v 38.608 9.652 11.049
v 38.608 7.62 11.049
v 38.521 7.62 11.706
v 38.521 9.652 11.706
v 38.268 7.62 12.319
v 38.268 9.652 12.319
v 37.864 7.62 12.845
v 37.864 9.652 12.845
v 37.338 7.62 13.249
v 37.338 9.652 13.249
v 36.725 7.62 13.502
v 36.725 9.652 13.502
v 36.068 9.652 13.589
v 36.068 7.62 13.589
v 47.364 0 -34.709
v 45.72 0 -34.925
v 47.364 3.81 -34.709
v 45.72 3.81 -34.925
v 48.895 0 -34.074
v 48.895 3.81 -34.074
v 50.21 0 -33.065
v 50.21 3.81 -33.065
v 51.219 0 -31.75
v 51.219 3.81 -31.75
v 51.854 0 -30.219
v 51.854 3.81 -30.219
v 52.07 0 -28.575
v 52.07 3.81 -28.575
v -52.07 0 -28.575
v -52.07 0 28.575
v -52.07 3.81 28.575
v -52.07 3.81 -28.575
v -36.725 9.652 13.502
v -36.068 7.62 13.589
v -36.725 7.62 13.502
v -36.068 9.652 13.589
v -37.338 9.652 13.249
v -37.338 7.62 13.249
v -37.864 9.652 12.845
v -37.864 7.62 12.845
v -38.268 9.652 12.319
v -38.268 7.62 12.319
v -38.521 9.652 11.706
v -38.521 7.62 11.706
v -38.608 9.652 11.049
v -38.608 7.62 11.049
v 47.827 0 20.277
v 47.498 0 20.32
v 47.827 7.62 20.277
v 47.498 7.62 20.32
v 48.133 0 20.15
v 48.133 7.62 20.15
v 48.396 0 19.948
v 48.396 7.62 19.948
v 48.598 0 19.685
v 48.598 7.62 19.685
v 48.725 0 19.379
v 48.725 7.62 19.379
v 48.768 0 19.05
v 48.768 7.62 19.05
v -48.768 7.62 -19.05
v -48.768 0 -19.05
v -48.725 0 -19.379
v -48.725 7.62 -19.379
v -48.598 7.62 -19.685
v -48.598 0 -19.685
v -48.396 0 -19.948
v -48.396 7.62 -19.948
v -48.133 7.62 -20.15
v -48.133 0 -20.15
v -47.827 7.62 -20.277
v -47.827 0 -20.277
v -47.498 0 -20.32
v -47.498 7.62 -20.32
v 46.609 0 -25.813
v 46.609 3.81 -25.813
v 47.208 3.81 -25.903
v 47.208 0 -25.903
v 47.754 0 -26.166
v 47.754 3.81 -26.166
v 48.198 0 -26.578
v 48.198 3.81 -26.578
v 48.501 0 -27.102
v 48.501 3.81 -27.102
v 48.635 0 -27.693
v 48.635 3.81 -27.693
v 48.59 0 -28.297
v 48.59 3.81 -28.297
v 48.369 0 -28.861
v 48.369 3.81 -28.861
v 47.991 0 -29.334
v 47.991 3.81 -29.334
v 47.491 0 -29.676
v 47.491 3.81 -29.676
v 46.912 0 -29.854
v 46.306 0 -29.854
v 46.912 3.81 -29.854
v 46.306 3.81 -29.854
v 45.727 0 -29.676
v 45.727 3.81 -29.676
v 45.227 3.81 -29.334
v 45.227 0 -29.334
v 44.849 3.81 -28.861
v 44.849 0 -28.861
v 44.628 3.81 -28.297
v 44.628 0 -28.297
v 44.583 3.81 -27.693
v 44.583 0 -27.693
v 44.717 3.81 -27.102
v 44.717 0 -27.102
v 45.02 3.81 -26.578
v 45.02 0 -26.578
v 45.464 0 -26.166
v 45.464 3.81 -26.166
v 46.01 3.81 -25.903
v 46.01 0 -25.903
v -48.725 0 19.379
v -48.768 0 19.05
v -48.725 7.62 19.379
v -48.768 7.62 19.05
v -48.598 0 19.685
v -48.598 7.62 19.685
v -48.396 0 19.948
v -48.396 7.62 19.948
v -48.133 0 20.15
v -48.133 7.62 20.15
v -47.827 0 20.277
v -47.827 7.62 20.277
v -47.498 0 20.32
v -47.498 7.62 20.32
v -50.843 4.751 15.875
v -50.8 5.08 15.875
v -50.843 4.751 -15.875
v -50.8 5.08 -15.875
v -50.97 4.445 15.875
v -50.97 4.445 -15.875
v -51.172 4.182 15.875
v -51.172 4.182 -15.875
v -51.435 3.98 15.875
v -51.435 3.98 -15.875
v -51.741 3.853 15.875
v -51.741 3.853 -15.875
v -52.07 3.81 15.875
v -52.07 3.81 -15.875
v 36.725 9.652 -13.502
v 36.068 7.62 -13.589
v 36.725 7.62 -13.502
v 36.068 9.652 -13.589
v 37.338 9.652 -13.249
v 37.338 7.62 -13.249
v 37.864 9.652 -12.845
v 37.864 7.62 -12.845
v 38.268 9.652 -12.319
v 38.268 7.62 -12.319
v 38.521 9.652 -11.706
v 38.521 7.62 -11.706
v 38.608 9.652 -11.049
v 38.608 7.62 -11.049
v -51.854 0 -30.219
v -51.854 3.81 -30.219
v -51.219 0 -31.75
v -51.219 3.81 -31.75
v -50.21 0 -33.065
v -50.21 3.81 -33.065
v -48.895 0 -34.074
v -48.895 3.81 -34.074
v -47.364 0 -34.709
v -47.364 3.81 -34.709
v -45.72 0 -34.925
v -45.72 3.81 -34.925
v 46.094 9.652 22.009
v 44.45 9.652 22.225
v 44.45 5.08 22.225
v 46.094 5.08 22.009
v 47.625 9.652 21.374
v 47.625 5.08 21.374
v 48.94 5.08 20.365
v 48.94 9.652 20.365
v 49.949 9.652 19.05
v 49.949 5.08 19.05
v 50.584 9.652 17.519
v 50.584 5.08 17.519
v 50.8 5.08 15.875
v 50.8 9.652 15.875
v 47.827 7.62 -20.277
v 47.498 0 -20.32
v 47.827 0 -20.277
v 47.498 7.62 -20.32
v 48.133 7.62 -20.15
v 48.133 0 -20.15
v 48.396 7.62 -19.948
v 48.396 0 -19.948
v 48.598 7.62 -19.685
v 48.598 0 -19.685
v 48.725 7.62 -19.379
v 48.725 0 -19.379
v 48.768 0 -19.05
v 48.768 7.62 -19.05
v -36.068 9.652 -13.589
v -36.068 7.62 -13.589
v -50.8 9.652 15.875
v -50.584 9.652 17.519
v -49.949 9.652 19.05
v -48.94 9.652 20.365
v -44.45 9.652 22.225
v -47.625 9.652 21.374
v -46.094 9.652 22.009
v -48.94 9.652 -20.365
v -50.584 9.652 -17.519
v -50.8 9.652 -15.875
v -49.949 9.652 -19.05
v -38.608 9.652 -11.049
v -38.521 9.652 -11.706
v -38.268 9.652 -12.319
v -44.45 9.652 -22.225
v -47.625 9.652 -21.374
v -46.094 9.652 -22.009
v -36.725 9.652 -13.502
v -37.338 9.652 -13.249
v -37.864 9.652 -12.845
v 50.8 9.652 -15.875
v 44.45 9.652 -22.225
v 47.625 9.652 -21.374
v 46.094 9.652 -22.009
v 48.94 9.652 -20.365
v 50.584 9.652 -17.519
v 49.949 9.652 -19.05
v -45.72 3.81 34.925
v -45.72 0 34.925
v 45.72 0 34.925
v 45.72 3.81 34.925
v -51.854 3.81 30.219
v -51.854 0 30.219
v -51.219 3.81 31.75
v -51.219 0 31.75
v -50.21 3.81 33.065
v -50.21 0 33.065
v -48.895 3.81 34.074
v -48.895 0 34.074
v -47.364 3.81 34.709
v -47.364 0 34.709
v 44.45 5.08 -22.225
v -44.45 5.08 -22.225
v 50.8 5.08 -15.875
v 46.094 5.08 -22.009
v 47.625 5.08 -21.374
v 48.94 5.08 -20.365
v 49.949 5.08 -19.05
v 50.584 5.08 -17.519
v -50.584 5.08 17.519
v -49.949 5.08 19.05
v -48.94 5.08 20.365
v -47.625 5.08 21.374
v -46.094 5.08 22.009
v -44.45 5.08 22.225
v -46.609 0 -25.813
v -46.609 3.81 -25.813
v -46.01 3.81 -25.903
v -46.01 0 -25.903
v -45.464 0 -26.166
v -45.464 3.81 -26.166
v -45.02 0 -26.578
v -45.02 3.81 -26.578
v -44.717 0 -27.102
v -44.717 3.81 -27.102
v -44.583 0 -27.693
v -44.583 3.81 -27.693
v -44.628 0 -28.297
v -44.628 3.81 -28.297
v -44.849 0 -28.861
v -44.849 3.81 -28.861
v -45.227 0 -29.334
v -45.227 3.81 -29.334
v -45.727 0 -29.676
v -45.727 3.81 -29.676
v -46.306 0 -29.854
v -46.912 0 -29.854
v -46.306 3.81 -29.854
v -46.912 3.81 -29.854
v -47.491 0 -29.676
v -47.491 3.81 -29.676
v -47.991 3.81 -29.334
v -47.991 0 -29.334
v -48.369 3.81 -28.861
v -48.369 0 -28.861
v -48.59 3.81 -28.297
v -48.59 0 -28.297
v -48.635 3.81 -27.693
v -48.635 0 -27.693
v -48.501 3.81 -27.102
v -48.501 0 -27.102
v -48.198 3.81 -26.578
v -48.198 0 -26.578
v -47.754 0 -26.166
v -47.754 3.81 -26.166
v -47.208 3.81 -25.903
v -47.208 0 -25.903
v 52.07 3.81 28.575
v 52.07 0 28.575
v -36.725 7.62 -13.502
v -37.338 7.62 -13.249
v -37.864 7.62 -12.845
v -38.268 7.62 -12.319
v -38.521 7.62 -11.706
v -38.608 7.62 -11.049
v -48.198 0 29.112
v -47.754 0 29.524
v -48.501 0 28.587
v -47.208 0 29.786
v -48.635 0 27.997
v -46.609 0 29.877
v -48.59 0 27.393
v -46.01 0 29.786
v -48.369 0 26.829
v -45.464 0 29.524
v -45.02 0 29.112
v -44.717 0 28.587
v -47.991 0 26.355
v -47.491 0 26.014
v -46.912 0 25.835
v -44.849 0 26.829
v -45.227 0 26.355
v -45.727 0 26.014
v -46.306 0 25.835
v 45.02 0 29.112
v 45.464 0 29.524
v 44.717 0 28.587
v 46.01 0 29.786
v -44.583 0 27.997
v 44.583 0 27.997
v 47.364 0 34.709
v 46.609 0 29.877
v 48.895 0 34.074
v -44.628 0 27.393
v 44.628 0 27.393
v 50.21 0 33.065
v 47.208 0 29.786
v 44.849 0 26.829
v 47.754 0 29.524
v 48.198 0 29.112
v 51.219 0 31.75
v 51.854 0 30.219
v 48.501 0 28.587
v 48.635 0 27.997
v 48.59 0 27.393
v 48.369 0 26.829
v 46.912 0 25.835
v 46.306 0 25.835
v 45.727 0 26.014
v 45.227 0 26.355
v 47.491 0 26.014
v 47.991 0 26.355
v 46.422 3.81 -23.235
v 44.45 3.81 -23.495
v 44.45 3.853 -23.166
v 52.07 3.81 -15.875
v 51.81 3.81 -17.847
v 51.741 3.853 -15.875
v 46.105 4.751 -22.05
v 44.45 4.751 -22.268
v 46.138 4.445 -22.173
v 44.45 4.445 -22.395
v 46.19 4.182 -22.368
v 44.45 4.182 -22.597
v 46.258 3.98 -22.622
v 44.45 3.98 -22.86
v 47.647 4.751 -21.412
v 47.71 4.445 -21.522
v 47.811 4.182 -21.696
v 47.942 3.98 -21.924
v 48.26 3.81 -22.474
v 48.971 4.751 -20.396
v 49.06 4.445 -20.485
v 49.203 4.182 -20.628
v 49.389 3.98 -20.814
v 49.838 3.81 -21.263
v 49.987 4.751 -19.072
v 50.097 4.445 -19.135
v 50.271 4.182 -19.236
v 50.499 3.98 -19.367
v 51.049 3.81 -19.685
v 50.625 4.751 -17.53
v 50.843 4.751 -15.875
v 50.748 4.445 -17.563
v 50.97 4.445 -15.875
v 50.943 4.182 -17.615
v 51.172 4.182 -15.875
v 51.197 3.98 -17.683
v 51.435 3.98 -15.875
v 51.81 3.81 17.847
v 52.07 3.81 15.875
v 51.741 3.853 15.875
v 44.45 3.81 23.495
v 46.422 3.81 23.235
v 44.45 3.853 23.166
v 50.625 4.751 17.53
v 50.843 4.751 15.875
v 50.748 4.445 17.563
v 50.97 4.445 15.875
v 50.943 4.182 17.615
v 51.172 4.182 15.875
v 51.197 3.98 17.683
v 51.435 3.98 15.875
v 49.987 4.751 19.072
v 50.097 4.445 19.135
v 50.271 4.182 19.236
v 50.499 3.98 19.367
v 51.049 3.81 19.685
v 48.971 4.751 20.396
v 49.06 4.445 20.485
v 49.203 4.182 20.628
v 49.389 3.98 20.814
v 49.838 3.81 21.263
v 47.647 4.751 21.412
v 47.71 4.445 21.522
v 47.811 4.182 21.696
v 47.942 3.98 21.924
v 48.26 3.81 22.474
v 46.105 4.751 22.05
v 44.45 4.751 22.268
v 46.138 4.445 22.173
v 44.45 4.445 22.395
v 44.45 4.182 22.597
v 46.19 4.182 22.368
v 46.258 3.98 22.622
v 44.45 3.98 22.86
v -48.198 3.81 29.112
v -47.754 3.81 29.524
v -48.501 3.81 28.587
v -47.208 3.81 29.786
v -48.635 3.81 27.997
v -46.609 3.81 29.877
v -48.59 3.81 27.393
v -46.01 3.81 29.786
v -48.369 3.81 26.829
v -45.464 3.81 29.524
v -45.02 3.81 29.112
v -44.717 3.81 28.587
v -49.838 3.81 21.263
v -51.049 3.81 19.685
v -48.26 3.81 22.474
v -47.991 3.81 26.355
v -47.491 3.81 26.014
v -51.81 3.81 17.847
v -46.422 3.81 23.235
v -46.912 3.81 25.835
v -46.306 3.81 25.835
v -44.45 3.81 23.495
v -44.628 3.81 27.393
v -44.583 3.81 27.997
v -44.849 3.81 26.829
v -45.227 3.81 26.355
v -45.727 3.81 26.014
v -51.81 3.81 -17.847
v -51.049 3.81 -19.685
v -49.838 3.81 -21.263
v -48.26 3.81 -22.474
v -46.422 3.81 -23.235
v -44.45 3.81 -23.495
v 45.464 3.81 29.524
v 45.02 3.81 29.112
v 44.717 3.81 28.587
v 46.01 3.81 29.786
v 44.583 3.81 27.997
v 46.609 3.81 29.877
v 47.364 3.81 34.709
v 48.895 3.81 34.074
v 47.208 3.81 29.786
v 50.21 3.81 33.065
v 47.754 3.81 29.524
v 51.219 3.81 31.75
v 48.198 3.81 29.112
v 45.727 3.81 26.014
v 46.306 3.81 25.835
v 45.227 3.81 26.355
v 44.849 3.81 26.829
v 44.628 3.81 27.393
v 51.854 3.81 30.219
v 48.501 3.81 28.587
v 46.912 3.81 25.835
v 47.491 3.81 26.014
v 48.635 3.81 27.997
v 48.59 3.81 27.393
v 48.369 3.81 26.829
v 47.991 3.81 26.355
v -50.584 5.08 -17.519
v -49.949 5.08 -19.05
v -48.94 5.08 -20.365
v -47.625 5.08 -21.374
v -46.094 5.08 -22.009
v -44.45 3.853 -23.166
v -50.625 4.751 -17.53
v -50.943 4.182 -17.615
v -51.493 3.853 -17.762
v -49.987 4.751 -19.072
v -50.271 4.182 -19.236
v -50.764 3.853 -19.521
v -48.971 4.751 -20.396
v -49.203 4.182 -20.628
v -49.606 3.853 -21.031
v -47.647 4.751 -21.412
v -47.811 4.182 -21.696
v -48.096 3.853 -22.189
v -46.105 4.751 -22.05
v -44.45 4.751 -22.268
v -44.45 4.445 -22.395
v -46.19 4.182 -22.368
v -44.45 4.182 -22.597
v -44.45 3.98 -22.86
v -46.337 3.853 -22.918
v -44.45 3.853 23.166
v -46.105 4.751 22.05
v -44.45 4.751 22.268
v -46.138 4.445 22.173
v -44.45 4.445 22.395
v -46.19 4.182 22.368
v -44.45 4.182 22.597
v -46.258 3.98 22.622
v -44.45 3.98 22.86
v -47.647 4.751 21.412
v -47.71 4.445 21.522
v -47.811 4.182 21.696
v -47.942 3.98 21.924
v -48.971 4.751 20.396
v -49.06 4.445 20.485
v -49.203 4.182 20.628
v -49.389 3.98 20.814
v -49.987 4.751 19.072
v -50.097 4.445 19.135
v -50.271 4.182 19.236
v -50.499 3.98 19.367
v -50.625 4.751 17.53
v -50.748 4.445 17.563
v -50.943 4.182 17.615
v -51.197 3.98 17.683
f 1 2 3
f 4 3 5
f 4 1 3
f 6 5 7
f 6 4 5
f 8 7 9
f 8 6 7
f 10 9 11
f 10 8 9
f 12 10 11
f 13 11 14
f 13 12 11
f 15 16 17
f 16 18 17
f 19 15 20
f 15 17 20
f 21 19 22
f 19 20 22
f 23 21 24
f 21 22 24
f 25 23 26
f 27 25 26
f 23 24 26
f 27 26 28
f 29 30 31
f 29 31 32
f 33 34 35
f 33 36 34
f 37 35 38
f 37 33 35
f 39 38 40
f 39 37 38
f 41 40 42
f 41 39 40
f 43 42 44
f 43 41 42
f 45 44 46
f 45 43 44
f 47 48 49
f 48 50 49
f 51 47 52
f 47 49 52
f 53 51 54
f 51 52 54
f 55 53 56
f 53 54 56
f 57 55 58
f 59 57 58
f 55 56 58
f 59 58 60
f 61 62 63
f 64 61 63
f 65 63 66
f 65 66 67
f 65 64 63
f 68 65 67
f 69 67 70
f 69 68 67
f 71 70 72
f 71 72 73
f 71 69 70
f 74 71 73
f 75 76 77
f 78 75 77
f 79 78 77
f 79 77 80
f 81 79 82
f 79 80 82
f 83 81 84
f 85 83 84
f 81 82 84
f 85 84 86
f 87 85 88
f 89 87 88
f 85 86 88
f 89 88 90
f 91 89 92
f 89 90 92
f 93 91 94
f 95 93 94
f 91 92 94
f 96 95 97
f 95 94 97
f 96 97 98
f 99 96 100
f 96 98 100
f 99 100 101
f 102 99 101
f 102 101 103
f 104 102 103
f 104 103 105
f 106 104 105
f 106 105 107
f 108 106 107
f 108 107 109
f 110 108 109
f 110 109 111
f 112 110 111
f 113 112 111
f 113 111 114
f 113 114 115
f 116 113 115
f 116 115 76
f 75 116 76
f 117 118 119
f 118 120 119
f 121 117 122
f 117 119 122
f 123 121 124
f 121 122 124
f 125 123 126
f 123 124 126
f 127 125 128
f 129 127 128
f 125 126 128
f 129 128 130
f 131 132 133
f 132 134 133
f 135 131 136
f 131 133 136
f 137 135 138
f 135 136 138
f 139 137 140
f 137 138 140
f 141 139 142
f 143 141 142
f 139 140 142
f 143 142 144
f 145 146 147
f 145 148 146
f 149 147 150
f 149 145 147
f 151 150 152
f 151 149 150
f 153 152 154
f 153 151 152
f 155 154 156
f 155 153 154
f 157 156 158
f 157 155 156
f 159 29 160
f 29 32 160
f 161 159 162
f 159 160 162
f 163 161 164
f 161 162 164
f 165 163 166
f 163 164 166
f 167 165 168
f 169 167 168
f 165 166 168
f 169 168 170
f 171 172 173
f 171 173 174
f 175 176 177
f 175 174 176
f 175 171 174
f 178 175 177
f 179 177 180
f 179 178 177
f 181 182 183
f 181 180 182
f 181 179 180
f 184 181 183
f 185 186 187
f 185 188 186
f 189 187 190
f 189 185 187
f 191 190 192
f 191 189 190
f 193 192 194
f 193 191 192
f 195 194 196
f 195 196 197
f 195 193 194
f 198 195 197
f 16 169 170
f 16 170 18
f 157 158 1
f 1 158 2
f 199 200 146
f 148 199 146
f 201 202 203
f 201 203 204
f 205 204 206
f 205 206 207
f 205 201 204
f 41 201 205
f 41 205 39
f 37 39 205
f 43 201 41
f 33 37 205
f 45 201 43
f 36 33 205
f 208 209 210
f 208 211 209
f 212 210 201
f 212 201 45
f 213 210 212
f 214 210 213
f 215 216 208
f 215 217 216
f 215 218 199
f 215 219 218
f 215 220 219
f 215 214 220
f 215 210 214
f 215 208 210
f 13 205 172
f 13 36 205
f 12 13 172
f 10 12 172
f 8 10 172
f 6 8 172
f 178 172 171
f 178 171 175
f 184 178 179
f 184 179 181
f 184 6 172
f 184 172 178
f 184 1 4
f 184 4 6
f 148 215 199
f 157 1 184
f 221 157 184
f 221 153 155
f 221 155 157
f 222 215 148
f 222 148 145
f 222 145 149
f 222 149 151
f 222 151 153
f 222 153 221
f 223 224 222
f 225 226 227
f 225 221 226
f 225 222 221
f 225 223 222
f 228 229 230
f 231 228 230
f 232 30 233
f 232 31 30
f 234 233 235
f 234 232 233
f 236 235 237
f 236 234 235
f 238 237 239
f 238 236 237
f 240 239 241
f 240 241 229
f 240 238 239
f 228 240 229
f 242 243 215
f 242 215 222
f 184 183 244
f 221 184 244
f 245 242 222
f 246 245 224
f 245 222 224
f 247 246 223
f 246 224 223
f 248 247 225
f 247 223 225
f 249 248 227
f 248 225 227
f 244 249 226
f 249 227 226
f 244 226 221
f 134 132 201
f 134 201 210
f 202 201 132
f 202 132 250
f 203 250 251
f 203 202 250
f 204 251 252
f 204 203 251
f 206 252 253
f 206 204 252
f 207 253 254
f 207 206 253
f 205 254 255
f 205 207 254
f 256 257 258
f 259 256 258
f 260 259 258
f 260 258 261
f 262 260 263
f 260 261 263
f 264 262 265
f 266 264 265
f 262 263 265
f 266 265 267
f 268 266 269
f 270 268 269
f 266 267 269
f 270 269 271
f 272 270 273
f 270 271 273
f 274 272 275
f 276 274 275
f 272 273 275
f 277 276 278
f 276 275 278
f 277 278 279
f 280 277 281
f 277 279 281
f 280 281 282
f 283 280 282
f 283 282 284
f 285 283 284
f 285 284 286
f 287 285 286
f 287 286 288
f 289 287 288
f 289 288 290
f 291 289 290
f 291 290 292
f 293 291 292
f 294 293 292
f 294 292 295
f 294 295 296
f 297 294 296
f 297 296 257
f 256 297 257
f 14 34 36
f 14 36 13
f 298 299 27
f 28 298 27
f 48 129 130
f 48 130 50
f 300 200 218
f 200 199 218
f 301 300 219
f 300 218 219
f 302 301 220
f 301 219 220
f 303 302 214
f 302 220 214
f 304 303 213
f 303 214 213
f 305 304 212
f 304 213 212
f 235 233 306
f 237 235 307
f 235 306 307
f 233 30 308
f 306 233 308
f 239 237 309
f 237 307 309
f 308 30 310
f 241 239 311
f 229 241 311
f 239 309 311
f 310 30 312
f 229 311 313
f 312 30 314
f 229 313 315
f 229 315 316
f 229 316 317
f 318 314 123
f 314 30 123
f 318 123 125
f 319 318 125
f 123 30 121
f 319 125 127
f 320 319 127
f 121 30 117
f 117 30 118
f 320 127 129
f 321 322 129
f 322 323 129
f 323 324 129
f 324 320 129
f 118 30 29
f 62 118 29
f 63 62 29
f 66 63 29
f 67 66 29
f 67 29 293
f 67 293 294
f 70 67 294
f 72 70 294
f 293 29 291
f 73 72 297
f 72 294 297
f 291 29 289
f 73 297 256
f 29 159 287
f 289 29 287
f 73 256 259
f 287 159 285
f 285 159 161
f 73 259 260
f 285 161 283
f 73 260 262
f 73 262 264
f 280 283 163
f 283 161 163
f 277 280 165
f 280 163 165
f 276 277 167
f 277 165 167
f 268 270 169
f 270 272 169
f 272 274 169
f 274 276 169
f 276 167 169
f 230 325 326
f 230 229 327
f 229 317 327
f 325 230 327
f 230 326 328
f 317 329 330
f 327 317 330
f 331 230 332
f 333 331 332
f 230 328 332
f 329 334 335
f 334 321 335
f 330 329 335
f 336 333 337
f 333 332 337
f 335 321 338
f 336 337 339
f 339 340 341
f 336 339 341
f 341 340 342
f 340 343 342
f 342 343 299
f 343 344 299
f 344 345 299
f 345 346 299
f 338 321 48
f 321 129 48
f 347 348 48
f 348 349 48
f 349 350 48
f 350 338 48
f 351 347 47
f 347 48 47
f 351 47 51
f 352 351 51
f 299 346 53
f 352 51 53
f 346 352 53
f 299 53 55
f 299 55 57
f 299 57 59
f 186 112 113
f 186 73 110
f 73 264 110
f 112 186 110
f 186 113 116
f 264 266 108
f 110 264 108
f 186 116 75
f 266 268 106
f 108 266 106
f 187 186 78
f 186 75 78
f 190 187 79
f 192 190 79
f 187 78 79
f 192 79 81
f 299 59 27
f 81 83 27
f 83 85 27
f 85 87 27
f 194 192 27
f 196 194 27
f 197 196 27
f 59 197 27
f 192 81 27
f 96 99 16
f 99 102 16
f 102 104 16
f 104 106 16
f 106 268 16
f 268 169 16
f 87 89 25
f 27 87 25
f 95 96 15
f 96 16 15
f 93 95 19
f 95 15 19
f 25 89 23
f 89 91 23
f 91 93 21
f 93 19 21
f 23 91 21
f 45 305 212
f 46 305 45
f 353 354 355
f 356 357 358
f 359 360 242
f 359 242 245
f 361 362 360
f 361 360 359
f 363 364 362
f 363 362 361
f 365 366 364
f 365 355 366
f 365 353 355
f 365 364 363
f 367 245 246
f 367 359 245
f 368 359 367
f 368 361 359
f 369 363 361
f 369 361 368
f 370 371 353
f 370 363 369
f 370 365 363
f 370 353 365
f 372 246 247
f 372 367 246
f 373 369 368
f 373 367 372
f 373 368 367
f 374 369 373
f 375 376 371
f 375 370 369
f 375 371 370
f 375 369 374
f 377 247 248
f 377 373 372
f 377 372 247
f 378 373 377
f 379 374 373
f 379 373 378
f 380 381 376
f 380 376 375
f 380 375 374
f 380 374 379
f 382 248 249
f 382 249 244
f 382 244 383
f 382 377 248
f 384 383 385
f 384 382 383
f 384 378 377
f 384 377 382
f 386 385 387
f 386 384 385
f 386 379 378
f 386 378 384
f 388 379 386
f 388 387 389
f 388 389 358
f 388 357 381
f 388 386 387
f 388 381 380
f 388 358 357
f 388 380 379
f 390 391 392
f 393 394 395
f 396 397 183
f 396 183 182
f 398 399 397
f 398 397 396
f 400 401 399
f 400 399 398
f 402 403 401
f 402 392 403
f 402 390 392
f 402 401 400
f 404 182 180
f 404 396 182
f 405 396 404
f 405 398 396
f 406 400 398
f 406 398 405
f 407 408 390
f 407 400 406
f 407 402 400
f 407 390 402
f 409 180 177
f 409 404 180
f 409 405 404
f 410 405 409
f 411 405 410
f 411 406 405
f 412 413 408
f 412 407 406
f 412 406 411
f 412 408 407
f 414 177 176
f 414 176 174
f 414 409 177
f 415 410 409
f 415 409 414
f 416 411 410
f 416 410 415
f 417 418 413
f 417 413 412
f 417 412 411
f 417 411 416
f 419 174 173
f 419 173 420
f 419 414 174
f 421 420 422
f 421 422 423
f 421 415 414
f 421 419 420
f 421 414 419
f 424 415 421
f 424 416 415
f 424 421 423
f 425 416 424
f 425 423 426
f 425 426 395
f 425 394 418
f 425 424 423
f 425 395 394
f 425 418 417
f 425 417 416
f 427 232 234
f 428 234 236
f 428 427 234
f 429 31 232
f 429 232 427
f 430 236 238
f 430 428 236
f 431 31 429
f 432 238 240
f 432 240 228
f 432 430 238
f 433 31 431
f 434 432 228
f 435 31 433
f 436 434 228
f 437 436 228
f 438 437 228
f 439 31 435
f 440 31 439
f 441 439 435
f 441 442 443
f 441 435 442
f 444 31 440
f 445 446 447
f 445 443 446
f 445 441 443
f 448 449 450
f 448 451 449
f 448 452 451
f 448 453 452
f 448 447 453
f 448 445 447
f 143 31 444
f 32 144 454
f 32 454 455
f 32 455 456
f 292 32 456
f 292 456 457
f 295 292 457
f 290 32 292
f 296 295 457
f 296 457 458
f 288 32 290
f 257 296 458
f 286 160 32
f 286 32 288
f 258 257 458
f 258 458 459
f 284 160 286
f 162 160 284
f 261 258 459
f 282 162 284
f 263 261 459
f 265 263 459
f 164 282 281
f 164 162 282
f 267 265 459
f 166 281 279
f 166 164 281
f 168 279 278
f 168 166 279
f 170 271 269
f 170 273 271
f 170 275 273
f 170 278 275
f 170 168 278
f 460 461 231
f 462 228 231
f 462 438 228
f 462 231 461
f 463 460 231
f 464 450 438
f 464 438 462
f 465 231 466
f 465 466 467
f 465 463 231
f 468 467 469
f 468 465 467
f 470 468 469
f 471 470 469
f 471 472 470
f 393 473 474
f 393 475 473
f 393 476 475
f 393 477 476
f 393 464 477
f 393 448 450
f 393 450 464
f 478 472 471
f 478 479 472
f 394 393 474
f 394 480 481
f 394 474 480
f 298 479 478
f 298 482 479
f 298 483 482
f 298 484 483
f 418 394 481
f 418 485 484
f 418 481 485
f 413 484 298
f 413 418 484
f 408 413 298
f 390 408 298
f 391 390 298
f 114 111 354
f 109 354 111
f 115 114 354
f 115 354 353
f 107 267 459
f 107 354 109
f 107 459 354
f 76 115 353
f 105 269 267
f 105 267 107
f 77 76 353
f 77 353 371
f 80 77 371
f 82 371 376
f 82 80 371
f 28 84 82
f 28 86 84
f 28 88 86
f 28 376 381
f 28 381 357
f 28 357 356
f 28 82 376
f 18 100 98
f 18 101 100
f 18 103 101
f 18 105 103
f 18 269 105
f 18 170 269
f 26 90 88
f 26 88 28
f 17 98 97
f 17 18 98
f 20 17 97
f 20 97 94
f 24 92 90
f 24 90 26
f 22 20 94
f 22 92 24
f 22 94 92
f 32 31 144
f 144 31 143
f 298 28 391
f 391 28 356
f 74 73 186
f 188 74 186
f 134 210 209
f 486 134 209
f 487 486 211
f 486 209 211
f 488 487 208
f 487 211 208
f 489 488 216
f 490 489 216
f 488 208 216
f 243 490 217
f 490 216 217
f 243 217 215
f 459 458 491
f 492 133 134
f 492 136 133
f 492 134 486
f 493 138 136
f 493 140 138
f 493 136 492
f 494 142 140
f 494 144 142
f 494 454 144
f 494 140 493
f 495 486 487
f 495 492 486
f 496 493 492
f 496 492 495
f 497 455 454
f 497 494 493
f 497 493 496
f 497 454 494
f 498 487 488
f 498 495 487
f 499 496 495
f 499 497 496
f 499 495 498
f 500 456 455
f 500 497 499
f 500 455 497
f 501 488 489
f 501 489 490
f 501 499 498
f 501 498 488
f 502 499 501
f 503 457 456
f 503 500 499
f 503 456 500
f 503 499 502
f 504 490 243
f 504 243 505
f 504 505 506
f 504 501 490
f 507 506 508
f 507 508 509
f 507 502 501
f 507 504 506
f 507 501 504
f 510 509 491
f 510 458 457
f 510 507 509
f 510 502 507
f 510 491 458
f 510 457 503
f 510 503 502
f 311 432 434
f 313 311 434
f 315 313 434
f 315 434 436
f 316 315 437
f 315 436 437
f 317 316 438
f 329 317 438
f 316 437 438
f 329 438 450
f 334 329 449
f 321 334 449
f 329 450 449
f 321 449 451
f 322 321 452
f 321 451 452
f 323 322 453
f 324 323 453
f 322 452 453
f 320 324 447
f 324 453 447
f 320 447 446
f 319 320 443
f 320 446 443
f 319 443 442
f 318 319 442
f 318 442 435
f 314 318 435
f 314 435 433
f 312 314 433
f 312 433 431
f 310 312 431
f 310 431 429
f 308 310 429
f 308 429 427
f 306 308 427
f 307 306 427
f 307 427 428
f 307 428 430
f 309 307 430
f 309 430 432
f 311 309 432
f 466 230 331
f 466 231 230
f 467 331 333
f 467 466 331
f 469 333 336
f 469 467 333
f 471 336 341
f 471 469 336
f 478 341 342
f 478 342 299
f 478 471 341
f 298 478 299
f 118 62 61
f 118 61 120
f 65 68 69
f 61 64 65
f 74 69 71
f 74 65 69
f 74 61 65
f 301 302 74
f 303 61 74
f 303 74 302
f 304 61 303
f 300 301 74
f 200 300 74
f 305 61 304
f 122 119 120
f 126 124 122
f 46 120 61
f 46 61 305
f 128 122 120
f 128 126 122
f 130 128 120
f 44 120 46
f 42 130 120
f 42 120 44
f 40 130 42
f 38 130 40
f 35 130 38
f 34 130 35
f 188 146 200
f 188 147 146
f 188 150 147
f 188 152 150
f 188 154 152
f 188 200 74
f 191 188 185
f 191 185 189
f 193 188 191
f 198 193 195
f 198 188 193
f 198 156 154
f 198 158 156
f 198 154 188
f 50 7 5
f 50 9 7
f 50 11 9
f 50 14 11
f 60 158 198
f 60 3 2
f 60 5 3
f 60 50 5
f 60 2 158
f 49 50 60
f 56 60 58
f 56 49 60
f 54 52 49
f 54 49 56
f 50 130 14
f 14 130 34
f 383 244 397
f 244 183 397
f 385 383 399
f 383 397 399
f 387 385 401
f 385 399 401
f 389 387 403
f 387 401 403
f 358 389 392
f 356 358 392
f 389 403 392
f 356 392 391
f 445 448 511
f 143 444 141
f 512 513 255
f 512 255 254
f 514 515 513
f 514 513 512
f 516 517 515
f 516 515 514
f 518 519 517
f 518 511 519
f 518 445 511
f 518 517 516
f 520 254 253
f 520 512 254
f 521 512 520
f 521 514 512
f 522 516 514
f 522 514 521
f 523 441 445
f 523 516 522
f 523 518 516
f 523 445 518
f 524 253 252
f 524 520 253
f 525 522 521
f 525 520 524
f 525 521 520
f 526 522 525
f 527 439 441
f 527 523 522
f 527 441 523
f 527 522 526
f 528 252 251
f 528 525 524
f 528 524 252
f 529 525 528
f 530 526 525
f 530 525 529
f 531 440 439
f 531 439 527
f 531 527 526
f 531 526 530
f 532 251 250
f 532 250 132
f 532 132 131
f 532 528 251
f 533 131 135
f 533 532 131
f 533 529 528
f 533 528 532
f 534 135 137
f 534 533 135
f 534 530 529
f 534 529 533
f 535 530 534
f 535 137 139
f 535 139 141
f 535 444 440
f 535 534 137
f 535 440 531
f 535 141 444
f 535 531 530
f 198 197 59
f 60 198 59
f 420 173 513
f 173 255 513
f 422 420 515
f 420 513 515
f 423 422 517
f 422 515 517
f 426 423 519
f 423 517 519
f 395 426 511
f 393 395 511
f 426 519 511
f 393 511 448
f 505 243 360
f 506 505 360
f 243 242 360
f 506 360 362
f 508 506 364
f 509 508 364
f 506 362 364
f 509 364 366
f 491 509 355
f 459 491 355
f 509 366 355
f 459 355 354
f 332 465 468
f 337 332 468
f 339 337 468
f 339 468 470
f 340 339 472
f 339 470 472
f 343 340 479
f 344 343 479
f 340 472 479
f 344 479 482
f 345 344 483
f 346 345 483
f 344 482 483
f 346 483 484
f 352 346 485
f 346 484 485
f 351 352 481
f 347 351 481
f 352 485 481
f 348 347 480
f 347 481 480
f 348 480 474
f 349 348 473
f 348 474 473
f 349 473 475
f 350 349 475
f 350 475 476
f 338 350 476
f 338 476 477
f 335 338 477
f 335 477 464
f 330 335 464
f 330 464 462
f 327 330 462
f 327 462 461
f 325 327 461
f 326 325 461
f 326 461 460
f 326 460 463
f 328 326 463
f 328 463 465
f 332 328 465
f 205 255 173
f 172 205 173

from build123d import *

# Parameters (mm, degrees)
SKETCH1_W           = 104.14
SKETCH1_H           = 69.85
BOSS_EXTRUDE1_DEPTH = 3.81
SKETCH2_W           = 101.6
SKETCH2_H           = 44.45
BOSS_EXTRUDE2_DEPTH = 5.842
SKETCH4_W           = 97.536
SKETCH4_H           = 40.64
CUT_EXTRUDE1_DEPTH  = 7.62
SKETCH5_W           = 77.216
SKETCH5_H           = 27.178
CUT_EXTRUDE2_DEPTH  = 5.842
FILLET1_R           = 2.54
FILLET2_R           = 6.35
FILLET3_R           = 1.27
SKETCH6_R           = 2.032
CUT_EXTRUDE3_DEPTH  = 5.842
FILLET4_R           = 1.27


with BuildPart() as part:
    # Sketch1 → Boss-Extrude1 (new body)
    with BuildSketch(Plane(origin=(0, 0, 0), x_dir=(1, 0, 0), z_dir=(0, 1, 0))):
        Rectangle(SKETCH1_W, SKETCH1_H)
    extrude(amount=BOSS_EXTRUDE1_DEPTH)

    # Sketch2 → Boss-Extrude2 (add)
    with BuildSketch(Plane(origin=(0, 3.81, 0), x_dir=(1, 0, 0), z_dir=(0, 1, 0))):
        Rectangle(SKETCH2_W, SKETCH2_H)
    extrude(amount=BOSS_EXTRUDE2_DEPTH)

    # Sketch4 → Cut-Extrude1 (cut)
    with BuildSketch(Plane.XZ):
        Rectangle(SKETCH4_W, SKETCH4_H)
    extrude(amount=-CUT_EXTRUDE1_DEPTH, mode=Mode.SUBTRACT)

    # Sketch5 → Cut-Extrude2 (cut)
    with BuildSketch(Plane.XZ.offset(-7.62)):
        Rectangle(SKETCH5_W, SKETCH5_H)
    extrude(amount=-CUT_EXTRUDE2_DEPTH, mode=Mode.SUBTRACT)

    # Fillet1
    fillet1_edges = [part.edges().sort_by_distance(p)[0] for p in [
        (-38.608, 8.636, -13.589),
        (-38.608, 8.636, 13.589),
        (38.608, 8.636, 13.589),
        (38.608, 8.636, -13.589),
    ]]
    fillet(fillet1_edges, radius=FILLET1_R)

    # Fillet2
    fillet2_edges = [part.edges().sort_by_distance(p)[0] for p in [
        (50.8, 6.731, 22.225),
        (50.8, 6.731, -22.225),
        (-50.8, 6.731, -22.225),
        (-50.8, 6.731, 22.225),
        (-52.07, 1.905, -34.925),
        (52.07, 1.905, -34.925),
        (52.07, 1.905, 34.925),
        (-52.07, 1.905, 34.925),
    ]]
    fillet(fillet2_edges, radius=FILLET2_R)

    # Fillet3
    fillet3_edges = [part.edges().sort_by_distance(p)[0] for p in [
        (0, 3.81, -22.225),
        (50.8, 3.81, 0),
        (0, 3.81, 22.225),
        (-50.8, 3.81, 0),
        (48.940128061, 3.81, -20.365128061),
        (-48.940128061, 3.81, -20.365128061),
        (-48.940128061, 3.81, 20.365128061),
        (48.940128061, 3.81, 20.365128061),
    ]]
    fillet(fillet3_edges, radius=FILLET3_R - 0.0001)  # a hair under: the kernel refuses the full size

    # Sketch6 → Cut-Extrude3 (cut)
    with BuildSketch(Plane(origin=(0, 3.81, 0), x_dir=(1, 0, 0), z_dir=(0, 1, 0))):
        with Locations(Location((-46.609, 27.84475, 0), (0, 0, 270))):
            Circle(SKETCH6_R)
        with Locations(Location((46.609, 27.84475, 0), (0, 0, 270))):
            Circle(SKETCH6_R)
        with Locations(Location((46.609, -27.84475, 0), (0, 0, 270))):
            Circle(SKETCH6_R)
        with Locations(Location((-46.609, -27.84475, 0), (0, 0, 270))):
            Circle(SKETCH6_R)
    extrude(amount=-CUT_EXTRUDE3_DEPTH, mode=Mode.SUBTRACT)

    # Fillet4
    fillet4_edges = [part.edges().sort_by_distance(p)[0] for p in [
        (-48.768, 3.81, -20.32),
        (-48.768, 3.81, 20.32),
        (48.768, 3.81, 20.32),
        (48.768, 3.81, -20.32),
    ]]
    fillet(fillet4_edges, radius=FILLET4_R)


solid = part.part
